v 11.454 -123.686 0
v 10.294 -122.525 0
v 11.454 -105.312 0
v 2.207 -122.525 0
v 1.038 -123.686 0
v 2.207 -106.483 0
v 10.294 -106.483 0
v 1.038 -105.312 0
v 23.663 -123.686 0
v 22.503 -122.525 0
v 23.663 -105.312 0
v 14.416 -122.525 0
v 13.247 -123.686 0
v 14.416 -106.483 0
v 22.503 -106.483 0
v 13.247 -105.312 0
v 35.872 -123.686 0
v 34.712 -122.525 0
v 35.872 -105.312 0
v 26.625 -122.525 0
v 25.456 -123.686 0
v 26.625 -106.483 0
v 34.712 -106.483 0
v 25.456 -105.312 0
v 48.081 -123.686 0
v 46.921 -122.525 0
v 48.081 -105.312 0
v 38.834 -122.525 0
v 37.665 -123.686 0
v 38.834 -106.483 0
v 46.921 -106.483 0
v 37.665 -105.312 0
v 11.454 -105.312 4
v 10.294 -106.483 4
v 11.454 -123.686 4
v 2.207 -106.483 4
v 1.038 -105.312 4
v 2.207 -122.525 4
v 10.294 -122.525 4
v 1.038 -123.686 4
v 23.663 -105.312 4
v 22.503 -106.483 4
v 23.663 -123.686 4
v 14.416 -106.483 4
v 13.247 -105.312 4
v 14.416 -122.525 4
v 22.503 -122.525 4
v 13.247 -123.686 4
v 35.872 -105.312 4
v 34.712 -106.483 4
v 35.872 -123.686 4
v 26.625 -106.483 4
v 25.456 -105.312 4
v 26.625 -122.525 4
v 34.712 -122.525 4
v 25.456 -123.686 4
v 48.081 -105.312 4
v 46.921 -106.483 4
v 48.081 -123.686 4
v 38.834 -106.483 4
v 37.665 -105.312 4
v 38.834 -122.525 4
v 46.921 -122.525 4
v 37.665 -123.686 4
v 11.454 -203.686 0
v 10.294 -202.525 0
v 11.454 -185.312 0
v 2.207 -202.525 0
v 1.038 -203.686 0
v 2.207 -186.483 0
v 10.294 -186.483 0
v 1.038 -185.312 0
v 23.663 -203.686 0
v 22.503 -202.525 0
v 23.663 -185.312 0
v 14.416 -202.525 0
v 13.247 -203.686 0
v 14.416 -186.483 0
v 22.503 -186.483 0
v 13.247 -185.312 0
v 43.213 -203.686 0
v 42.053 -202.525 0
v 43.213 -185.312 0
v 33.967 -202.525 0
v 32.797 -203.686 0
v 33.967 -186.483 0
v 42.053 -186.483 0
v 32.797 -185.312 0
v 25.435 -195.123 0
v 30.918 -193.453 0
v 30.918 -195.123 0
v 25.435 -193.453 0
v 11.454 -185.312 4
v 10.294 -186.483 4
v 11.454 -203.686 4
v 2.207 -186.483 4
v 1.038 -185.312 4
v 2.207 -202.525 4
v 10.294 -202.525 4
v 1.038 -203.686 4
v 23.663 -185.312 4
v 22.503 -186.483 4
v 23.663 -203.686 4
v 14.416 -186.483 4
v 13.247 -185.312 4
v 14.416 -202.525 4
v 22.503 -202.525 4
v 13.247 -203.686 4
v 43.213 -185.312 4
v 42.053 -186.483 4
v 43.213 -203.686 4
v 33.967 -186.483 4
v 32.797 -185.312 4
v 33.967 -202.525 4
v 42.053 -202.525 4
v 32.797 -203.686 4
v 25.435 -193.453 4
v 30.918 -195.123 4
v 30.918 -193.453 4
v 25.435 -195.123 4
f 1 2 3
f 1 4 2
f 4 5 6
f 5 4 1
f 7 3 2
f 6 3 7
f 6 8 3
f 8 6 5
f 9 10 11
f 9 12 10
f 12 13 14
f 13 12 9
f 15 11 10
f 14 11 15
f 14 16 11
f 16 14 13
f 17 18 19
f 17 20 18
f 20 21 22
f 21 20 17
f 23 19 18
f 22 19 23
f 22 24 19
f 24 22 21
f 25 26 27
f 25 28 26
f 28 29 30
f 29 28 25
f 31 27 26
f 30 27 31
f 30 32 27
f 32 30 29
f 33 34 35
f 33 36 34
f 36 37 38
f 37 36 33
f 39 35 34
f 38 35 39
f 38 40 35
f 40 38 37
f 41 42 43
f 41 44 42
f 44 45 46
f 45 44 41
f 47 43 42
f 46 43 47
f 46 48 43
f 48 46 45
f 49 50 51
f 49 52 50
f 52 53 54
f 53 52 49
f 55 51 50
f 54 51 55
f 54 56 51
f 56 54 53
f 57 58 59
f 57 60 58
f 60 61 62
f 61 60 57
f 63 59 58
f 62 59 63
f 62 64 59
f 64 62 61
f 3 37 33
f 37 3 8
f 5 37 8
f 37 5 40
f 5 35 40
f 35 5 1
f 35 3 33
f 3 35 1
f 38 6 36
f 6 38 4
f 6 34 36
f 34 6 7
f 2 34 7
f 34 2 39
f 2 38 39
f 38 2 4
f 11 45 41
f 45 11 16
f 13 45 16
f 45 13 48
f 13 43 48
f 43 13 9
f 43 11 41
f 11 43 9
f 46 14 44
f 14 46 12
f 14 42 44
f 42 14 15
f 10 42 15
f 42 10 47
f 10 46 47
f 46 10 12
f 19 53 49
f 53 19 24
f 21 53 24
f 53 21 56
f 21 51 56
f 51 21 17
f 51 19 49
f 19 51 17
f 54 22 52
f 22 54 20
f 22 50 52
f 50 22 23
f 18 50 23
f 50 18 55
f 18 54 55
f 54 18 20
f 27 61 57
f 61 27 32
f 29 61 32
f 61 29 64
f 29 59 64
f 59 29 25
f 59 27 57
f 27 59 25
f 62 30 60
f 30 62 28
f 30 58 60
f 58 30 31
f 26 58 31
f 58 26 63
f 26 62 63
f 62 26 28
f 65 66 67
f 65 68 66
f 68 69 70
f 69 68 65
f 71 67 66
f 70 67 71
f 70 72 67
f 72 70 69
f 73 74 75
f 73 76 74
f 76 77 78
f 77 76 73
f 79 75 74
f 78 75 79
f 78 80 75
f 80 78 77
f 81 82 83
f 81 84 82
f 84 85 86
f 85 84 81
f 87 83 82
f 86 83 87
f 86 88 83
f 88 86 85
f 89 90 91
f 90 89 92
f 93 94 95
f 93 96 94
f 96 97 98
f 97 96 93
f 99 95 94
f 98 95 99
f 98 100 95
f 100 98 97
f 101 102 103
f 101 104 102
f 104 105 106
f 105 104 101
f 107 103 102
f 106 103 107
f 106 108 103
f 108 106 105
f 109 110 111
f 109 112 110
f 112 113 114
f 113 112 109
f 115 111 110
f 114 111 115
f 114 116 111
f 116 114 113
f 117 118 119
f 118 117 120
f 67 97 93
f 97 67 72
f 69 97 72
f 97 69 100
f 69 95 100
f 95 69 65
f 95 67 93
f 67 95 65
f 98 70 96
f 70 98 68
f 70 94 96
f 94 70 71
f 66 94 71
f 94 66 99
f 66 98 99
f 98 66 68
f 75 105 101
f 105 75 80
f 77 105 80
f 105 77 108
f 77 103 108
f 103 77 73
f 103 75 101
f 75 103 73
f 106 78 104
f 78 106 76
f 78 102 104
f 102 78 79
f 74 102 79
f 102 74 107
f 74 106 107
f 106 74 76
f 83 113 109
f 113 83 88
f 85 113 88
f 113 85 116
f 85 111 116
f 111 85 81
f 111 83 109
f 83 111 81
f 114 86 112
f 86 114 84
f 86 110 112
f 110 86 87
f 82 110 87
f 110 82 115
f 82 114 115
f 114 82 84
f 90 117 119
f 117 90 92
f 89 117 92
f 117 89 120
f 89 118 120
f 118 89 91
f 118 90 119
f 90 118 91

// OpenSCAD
// 示例3：多种字体展示
fonts = [
    ["华文宋体", "STSong:style=Regular", -120],
    ["黑体-简", "Heiti SC:style=Regular", -200]
];

for (f = fonts) {
    translate([0, f[2], 0]) {
        linear_extrude(height = 4) {
            text(f[0], size = 15, font = f[1]);
        }
    }
}
